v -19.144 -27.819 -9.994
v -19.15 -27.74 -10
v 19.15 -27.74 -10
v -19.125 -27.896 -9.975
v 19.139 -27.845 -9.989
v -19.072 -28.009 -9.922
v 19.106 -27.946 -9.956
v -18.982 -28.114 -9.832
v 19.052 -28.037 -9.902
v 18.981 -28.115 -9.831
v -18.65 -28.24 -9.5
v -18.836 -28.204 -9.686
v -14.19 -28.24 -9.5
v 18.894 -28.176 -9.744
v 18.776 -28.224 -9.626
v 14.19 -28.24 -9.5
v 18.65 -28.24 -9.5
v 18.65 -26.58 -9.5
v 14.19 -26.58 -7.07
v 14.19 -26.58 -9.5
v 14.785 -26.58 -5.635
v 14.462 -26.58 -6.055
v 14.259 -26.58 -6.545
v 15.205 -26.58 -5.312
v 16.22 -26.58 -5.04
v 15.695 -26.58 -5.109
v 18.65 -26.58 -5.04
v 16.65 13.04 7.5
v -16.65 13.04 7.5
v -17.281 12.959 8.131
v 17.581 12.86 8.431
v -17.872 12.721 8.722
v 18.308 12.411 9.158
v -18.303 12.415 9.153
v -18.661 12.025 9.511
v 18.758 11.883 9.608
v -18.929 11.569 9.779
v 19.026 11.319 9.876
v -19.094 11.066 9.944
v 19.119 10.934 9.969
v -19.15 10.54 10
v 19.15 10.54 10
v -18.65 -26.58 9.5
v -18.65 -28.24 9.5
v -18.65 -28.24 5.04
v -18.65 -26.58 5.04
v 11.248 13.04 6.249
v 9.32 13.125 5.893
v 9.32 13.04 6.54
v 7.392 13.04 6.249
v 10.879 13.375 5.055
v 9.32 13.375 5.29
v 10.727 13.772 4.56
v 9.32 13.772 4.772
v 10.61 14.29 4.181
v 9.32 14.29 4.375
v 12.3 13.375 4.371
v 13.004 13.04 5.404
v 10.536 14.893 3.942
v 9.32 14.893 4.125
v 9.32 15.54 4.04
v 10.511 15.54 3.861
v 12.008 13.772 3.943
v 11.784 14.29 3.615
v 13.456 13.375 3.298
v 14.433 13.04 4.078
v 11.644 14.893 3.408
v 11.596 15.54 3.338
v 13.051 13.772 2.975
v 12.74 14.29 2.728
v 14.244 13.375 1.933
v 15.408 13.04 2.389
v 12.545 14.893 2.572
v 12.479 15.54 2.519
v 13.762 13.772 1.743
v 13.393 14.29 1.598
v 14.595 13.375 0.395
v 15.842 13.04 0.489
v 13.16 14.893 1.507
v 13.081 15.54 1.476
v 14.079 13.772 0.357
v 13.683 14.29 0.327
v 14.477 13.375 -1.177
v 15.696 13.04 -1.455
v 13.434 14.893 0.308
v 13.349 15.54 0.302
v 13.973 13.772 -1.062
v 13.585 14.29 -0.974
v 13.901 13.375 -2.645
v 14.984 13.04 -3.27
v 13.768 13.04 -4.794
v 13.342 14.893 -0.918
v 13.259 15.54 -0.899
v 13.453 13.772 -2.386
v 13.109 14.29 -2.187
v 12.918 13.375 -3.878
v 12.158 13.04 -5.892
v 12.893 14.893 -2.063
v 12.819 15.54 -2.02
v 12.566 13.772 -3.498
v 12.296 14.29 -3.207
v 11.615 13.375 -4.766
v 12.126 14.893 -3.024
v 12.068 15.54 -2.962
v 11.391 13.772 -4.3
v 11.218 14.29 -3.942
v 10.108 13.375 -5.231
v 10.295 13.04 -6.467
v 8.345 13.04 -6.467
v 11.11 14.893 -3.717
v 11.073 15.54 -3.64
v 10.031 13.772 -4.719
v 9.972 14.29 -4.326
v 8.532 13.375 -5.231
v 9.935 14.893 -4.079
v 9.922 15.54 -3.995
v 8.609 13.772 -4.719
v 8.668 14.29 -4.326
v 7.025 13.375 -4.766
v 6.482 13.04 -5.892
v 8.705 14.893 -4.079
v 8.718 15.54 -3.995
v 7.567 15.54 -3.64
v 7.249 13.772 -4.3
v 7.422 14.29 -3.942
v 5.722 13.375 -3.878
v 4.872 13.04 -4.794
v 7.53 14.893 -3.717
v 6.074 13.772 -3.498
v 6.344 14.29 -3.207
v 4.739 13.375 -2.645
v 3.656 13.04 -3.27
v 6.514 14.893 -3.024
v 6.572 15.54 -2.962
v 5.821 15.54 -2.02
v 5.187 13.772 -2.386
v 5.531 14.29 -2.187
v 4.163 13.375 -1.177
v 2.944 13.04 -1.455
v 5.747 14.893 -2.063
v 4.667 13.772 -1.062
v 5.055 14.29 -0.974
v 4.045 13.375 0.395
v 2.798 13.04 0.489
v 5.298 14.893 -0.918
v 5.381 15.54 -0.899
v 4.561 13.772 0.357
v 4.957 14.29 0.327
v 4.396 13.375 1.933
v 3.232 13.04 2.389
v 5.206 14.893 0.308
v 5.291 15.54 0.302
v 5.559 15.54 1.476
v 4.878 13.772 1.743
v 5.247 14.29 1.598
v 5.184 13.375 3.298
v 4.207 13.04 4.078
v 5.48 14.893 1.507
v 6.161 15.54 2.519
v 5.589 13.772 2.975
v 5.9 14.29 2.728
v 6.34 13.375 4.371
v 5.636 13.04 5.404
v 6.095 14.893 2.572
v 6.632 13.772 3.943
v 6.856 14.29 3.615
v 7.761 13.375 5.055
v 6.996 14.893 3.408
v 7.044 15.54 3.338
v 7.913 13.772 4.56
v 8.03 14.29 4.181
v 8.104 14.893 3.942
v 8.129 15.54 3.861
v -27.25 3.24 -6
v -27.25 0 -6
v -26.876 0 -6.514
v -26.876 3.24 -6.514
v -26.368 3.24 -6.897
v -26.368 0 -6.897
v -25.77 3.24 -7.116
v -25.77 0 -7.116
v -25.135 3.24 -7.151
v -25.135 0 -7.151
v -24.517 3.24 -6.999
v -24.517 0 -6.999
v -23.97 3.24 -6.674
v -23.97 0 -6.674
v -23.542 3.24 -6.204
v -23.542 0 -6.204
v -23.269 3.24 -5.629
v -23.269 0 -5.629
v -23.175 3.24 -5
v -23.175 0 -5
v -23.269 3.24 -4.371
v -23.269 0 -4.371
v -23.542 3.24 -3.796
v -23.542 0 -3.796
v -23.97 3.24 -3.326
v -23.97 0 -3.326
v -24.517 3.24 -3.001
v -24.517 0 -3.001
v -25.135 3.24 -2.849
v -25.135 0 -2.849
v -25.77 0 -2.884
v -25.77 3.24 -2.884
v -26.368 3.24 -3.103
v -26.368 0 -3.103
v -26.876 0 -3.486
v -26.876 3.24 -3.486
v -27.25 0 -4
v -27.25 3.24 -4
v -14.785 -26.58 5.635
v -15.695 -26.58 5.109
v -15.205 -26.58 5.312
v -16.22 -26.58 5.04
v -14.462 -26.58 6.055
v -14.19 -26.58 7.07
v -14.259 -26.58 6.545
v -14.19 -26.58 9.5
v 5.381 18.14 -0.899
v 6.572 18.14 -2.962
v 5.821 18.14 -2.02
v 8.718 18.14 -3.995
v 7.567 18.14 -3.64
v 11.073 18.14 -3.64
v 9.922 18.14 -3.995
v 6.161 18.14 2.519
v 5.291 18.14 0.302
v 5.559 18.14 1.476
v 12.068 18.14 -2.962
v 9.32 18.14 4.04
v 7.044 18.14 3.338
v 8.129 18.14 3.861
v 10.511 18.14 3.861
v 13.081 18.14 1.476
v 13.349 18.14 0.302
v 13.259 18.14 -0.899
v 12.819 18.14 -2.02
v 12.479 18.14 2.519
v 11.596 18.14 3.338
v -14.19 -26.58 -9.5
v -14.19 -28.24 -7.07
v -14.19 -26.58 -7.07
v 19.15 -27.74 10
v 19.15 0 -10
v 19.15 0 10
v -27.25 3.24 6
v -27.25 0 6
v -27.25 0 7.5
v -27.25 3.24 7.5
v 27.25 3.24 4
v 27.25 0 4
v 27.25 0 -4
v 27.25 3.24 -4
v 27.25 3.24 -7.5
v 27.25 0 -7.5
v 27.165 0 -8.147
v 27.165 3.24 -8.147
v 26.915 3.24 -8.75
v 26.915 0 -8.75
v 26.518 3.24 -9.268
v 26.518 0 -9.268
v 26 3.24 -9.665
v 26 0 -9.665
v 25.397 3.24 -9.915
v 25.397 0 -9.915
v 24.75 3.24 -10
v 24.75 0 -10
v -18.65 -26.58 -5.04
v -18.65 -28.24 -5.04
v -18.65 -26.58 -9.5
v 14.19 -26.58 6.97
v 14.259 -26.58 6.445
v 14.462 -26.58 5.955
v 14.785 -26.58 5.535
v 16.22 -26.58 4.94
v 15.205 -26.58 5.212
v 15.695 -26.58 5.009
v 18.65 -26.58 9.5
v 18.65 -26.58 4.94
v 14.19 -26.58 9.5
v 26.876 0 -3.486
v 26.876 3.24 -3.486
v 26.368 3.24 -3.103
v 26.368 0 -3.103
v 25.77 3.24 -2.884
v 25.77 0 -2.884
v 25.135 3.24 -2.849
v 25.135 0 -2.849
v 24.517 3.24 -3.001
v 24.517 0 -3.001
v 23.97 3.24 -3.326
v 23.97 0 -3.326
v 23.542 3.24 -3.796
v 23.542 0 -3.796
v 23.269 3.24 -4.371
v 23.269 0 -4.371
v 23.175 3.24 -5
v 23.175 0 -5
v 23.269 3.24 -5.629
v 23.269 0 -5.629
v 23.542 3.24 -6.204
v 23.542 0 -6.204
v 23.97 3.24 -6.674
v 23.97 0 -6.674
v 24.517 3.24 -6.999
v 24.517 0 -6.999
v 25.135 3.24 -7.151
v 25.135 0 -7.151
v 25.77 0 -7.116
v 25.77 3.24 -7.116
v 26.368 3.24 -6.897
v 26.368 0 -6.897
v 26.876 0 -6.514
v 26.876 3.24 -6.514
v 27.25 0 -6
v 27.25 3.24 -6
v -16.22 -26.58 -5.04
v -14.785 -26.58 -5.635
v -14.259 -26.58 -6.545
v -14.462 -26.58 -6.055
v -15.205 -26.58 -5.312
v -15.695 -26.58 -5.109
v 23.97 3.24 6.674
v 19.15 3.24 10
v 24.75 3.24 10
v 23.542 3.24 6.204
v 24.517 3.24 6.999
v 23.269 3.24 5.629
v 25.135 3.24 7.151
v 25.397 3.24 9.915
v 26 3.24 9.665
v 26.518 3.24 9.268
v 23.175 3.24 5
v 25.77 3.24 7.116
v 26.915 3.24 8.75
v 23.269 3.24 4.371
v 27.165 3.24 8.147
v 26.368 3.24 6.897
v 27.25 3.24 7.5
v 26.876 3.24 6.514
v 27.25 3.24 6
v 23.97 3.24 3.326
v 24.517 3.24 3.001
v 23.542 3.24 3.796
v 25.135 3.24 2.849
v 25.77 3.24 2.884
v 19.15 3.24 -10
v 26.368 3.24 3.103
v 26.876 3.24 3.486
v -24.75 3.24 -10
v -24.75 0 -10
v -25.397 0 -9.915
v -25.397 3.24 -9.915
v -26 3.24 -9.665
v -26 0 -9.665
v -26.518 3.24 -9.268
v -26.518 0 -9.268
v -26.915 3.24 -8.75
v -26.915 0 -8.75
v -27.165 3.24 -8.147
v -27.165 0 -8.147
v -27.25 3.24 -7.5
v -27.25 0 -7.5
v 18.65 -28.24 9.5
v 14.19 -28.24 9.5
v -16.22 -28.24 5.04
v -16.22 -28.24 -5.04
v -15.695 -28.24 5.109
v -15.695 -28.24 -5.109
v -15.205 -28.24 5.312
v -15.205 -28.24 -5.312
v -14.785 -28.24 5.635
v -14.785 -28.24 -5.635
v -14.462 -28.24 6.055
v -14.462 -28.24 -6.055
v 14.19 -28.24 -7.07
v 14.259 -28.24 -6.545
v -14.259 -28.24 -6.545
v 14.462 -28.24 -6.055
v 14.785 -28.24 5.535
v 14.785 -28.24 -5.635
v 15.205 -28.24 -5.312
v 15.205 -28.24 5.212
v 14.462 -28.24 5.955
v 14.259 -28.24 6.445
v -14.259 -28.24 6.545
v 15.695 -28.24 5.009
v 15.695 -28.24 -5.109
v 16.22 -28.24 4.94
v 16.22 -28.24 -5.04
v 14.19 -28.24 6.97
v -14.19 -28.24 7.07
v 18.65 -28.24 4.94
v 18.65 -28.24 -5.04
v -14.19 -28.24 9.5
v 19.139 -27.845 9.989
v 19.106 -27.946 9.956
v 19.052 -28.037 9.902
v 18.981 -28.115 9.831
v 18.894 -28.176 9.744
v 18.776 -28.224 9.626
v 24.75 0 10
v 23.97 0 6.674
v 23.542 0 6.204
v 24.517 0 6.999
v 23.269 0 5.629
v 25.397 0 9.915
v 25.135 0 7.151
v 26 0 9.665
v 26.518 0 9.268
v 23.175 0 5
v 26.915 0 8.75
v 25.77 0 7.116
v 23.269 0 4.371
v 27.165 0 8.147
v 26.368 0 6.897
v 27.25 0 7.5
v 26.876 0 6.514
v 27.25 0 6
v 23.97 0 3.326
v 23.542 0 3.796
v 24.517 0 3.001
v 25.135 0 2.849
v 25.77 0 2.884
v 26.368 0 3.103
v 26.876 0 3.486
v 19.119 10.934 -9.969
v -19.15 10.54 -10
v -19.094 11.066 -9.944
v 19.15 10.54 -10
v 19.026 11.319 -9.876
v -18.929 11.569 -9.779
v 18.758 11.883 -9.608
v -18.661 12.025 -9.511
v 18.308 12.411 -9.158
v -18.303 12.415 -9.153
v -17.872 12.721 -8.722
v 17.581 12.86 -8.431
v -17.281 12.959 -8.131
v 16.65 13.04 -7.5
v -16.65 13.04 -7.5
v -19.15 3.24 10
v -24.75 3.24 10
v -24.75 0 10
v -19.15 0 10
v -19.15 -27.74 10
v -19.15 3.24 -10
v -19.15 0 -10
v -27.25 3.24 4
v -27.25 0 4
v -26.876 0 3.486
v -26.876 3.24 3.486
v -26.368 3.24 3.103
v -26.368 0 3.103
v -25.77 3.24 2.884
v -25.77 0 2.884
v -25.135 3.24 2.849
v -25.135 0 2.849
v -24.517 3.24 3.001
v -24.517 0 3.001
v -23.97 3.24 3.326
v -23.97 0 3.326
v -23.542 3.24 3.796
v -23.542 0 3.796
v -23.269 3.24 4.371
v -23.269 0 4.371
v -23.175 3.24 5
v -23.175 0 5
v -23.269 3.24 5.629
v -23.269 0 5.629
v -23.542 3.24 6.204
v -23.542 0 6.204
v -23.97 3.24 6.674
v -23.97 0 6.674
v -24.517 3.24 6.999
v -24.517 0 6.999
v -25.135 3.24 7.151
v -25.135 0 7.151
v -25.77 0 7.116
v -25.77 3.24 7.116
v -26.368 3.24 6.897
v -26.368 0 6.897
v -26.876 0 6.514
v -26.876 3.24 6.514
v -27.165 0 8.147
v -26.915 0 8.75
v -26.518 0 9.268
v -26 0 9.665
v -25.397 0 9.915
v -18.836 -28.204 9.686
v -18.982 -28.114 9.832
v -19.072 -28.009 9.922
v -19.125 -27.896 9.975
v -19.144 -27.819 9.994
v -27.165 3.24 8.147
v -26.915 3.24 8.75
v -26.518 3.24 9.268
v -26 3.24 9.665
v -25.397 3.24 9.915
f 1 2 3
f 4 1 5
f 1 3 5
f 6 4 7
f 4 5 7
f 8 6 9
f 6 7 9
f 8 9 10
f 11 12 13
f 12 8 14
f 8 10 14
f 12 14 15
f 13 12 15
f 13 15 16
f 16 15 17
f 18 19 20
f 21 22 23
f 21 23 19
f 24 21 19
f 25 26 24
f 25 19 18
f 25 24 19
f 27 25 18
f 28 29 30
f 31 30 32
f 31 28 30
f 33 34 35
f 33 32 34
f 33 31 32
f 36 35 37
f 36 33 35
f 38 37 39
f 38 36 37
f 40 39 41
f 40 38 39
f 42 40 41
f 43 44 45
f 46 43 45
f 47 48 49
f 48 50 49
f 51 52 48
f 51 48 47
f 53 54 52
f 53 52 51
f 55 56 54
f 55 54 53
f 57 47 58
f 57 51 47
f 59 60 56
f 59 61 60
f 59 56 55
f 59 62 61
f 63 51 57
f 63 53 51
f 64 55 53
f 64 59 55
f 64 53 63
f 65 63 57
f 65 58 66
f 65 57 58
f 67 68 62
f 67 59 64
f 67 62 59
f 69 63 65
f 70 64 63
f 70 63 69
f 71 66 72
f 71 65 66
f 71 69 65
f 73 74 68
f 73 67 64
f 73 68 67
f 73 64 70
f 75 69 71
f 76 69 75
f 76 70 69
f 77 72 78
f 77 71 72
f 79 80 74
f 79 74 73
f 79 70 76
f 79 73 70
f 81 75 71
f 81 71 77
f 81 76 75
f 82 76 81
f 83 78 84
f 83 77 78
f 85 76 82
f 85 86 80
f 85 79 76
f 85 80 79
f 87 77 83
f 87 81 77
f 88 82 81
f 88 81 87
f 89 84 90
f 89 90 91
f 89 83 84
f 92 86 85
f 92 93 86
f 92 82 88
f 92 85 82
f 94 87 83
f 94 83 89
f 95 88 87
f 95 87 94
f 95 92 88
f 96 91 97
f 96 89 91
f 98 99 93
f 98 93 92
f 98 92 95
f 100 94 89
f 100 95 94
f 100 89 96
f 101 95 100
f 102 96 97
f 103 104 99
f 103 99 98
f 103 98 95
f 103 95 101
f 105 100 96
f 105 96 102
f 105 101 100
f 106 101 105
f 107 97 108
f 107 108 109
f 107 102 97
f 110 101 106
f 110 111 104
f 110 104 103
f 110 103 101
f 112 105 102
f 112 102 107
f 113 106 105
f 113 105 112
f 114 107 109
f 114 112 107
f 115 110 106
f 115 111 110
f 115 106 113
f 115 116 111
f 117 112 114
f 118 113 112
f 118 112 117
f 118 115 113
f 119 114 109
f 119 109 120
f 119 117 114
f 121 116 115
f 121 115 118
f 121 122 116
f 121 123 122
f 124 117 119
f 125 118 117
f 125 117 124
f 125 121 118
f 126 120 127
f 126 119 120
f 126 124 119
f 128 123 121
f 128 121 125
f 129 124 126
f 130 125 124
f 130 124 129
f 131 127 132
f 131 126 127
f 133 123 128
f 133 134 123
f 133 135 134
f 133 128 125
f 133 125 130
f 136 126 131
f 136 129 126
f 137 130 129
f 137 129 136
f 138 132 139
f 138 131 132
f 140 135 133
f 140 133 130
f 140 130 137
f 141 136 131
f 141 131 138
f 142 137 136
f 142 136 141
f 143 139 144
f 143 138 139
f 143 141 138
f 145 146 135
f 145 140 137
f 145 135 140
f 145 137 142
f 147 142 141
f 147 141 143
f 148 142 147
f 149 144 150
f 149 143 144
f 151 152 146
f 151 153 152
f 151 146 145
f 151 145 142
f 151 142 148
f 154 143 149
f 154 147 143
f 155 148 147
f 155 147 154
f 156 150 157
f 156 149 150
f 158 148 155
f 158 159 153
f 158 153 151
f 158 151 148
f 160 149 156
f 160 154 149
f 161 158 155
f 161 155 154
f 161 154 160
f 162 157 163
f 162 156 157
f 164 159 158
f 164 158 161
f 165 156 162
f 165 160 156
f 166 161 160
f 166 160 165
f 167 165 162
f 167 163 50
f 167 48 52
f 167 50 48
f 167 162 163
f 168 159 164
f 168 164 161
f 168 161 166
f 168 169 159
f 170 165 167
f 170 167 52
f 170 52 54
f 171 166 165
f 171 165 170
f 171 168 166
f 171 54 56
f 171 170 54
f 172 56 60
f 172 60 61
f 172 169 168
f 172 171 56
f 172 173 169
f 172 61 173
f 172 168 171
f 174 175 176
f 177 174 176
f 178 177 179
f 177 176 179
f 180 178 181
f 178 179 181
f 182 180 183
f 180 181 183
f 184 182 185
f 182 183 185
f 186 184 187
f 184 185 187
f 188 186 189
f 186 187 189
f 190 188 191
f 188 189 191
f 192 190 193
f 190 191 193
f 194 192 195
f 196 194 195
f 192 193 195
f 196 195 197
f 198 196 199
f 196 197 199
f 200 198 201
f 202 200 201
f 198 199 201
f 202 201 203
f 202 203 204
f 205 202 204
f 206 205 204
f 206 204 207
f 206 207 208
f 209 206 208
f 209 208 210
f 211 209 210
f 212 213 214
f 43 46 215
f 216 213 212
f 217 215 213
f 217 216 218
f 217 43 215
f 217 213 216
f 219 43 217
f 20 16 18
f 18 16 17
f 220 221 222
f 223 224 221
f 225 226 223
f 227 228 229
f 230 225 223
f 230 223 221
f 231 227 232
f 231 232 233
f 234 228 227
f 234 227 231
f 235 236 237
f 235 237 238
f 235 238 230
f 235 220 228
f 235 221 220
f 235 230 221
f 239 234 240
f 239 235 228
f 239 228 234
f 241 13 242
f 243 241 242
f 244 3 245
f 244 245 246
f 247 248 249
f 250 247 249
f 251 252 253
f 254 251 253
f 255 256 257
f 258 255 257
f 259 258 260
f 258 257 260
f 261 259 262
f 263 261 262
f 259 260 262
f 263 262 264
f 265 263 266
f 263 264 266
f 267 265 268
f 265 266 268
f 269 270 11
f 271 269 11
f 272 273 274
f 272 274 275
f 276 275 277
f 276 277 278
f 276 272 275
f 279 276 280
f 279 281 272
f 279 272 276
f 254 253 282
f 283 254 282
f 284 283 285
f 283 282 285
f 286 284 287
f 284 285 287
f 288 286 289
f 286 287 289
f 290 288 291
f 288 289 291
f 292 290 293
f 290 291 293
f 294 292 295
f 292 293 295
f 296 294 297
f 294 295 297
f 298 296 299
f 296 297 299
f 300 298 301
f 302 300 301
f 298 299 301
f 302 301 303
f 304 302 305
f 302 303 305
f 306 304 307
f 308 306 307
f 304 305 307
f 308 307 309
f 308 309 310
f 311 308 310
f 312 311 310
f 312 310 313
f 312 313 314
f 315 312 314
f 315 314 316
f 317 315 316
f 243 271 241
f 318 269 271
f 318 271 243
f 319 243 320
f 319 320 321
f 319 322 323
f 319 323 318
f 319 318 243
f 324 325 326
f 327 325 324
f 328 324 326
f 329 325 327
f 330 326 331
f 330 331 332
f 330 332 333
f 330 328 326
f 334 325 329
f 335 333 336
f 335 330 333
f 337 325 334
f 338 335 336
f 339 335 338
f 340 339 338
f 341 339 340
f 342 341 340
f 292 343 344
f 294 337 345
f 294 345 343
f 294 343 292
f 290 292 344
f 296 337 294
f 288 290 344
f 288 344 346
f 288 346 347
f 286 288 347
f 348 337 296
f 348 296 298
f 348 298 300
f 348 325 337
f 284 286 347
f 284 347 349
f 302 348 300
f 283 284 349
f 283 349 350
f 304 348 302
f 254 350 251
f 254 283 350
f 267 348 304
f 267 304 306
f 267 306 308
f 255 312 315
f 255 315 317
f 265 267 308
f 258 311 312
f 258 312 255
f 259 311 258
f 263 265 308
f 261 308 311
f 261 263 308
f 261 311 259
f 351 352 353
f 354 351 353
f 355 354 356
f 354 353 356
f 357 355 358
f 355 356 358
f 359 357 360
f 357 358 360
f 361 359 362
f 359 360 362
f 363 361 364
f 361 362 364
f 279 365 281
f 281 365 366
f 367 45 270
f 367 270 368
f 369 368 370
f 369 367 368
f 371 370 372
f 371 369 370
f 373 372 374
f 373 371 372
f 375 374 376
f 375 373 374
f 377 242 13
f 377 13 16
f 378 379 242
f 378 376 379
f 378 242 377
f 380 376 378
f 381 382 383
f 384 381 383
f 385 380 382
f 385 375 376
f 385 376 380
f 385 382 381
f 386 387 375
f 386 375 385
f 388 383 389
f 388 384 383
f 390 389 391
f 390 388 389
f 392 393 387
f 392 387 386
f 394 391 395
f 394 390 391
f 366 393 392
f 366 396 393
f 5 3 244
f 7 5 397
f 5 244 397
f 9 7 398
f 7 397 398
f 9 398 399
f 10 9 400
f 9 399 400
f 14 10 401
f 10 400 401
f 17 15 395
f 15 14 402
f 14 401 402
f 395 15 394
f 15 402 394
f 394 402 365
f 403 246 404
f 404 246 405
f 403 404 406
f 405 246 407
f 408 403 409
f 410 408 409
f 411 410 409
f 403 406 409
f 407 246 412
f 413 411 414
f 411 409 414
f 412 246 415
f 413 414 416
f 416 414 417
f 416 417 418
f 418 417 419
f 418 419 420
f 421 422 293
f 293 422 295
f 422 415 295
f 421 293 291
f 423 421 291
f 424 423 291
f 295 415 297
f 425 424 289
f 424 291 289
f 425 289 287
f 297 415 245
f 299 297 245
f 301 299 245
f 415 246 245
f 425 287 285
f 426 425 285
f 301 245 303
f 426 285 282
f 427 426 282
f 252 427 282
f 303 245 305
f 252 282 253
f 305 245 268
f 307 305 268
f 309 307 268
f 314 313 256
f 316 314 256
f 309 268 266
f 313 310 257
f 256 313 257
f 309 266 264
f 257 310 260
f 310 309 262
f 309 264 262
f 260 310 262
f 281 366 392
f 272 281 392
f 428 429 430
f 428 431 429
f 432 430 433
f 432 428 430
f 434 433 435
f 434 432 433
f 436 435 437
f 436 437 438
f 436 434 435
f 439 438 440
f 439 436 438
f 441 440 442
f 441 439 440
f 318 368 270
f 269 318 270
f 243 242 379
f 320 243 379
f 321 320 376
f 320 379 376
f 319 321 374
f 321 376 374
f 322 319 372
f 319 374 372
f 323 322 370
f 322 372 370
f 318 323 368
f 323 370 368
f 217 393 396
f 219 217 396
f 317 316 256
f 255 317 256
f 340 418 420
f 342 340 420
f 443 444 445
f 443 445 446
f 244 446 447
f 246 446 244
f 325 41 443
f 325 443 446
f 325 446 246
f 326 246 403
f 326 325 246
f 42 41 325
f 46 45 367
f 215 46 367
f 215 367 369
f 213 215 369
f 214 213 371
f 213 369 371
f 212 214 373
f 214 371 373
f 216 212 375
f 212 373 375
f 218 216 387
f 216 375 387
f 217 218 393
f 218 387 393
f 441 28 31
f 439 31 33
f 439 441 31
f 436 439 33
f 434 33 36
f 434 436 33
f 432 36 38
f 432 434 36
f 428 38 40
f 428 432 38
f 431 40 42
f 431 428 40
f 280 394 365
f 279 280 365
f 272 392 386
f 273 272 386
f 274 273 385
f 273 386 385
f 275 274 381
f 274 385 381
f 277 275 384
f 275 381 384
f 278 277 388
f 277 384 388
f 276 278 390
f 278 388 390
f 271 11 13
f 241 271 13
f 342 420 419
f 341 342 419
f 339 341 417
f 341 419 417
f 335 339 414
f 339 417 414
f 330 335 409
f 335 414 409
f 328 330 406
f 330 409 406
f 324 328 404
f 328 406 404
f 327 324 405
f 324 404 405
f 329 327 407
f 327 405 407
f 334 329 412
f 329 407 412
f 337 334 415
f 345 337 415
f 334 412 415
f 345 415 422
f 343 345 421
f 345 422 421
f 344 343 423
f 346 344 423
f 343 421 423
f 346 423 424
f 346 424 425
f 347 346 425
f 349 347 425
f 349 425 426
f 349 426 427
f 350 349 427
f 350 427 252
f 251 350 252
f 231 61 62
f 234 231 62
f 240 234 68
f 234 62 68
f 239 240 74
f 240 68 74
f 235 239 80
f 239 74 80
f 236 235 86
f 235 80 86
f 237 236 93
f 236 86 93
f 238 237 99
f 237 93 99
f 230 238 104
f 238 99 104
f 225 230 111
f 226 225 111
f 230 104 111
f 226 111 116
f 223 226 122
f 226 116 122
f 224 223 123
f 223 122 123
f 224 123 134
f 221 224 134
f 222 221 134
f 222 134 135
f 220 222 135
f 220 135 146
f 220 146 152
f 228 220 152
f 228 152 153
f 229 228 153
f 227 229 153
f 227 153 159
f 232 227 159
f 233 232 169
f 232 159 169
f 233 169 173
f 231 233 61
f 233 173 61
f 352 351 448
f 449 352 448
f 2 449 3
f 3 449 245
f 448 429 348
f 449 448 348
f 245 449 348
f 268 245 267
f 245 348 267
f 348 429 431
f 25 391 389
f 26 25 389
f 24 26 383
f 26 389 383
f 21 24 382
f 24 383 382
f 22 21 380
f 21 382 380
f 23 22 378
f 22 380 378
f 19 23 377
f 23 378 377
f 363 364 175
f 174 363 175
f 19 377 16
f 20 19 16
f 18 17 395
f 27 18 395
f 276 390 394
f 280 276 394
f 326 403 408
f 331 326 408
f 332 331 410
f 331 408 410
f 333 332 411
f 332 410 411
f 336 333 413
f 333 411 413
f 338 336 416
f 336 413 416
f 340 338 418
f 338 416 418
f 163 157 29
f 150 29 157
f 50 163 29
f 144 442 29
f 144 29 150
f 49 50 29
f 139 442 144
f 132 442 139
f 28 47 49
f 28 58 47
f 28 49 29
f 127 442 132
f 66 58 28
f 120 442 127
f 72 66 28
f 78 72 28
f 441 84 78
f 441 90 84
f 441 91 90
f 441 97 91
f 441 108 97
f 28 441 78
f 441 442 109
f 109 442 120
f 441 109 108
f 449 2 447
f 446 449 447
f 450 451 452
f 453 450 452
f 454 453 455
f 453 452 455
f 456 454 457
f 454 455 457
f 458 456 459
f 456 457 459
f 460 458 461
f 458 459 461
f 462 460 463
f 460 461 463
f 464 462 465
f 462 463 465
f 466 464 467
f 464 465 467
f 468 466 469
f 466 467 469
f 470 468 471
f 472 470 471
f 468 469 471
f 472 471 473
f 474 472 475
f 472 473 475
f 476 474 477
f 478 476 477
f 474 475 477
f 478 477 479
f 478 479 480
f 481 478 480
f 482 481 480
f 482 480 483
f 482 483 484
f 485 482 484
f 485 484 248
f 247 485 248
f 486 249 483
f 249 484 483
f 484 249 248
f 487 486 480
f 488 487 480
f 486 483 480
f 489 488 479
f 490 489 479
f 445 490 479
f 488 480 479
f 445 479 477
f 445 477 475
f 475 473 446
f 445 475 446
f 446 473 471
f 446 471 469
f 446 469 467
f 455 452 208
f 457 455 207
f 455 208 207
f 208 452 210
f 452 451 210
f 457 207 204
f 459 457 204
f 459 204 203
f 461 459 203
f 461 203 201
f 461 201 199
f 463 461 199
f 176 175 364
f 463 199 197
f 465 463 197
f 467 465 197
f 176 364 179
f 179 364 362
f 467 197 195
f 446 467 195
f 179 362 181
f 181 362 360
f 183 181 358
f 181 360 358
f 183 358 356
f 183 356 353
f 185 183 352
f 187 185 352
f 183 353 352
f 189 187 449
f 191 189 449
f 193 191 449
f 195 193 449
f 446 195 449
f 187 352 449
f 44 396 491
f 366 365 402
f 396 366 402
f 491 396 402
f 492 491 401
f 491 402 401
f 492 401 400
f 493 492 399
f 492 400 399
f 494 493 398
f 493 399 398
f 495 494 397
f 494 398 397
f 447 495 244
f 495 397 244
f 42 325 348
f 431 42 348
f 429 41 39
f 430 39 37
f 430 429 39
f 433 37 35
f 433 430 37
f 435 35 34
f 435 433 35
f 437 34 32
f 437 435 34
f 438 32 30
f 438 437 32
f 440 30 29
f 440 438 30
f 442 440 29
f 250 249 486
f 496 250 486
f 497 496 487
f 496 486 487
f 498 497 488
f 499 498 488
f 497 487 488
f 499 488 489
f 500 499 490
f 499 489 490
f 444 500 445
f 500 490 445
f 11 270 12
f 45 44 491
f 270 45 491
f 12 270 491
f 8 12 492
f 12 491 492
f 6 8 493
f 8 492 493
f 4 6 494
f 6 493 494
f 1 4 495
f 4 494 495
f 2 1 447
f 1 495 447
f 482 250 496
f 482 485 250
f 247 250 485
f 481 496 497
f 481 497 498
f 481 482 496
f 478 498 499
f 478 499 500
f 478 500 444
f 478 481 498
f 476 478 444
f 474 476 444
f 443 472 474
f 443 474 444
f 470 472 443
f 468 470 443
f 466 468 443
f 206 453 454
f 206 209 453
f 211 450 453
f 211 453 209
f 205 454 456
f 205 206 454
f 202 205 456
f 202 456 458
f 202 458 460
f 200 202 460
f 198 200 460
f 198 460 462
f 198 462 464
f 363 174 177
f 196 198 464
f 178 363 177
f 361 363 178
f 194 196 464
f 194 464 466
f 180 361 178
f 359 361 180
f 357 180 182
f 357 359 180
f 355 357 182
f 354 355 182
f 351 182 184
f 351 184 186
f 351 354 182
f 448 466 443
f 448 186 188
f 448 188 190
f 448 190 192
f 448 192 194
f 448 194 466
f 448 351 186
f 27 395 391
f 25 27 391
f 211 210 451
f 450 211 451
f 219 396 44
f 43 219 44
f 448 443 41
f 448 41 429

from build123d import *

# Parameters (mm, degrees)
BOSS_EXTRUDE2_DEPTH   = 3.24
BOSS_EXTRUDE2_2_DEPTH = 3.24
SKETCH1_9_W           = 38.3
SKETCH1_9_H           = 20
BOSS_EXTRUDE3_DEPTH   = 13.04
SKETCH2_R             = 4.04
BOSS_EXTRUDE4_DEPTH   = 5.1
SKETCH1_10_W          = 38.3
SKETCH1_10_H          = 20
BOSS_EXTRUDE7_DEPTH   = 16.74
SKETCH5_W             = 38.3
SKETCH5_H             = 20
BOSS_EXTRUDE8_DEPTH   = 11.5
FILLET1_R             = 2.5
FILLET2_R             = 0.5
SKETCH6_R             = 2.03
CUT_EXTRUDE1_DEPTH    = 1.66


with BuildPart() as part:
    # Sketch1 → Boss-Extrude2 (new body)
    with BuildSketch(Plane(origin=(0, 0, 0), x_dir=(1, 0, 0), z_dir=(0, 1, 0))):
        with BuildLine():
            Line((-19.15, -10), (-19.15, 10))
            Line((-19.15, 10), (-24.75, 10))
            ThreePointArc((-24.75, 10), (-26.517766953, 9.267766953), (-27.25, 7.5))
            Line((-27.25, 7.5), (-27.25, 6))
            ThreePointArc((-27.25, 6), (-23.175424329, 5), (-27.25, 4))
            Line((-27.25, 4), (-27.25, -4))
            ThreePointArc((-27.25, -4), (-23.175424329, -5), (-27.25, -6))
            Line((-27.25, -6), (-27.25, -7.5))
            ThreePointArc((-27.25, -7.5), (-26.517766953, -9.267766953), (-24.75, -10))
            Line((-24.75, -10), (-19.15, -10))
        make_face()
    extrude(amount=BOSS_EXTRUDE2_DEPTH)



with BuildPart() as body_2:
    # Sketch1 → Boss-Extrude2 2 (new body)
    with BuildSketch(Plane(origin=(0, 0, 0), x_dir=(1, 0, 0), z_dir=(0, 1, 0))):
        with BuildLine():
            Line((24.75, 10), (19.15, 10))
            Line((19.15, 10), (19.15, -10))
            Line((19.15, -10), (24.75, -10))
            ThreePointArc((24.75, -10), (26.517766953, -9.267766953), (27.25, -7.5))
            Line((27.25, -7.5), (27.25, -6))
            ThreePointArc((27.25, -6), (23.175424329, -5), (27.25, -4))
            Line((27.25, -4), (27.25, 4))
            ThreePointArc((27.25, 4), (23.175424329, 5), (27.25, 6))
            Line((27.25, 6), (27.25, 7.5))
            ThreePointArc((27.25, 7.5), (26.517766953, 9.267766953), (24.75, 10))
        make_face()
    extrude(amount=BOSS_EXTRUDE2_2_DEPTH)


with BuildPart() as part_1:
    add(part.part)

    add(body_2.part)  # Boss-Extrude3 merges body 2
    # Sketch1<9> → Boss-Extrude3 (add)
    with BuildSketch(Plane(origin=(0, 0, 0), x_dir=(1, 0, 0), z_dir=(0, 1, 0))):
        Rectangle(SKETCH1_9_W, SKETCH1_9_H)
    extrude(amount=BOSS_EXTRUDE3_DEPTH)

    # Sketch2 → Boss-Extrude4 (add)
    with BuildSketch(Plane(origin=(0, 13.04, 0), x_dir=(1, 0, 0), z_dir=(0, 1, 0))):
        with Locations(Location((9.32, 0, 0), (0, 0, 270))):
            Circle(SKETCH2_R)
    extrude(amount=BOSS_EXTRUDE4_DEPTH)

    # Sketch1<10> → Boss-Extrude7 (add)
    with BuildSketch(Plane(origin=(0, 0, 0), x_dir=(1, 0, 0), z_dir=(0, 1, 0))):
        Rectangle(SKETCH1_10_W, SKETCH1_10_H)
    extrude(amount=-BOSS_EXTRUDE7_DEPTH)

    # Sketch5 → Boss-Extrude8 (add)
    with BuildSketch(Plane.XZ.offset(16.74)):
        Rectangle(SKETCH5_W, SKETCH5_H)
    extrude(amount=BOSS_EXTRUDE8_DEPTH)

    # Fillet1
    fillet1_edges = [part_1.edges().sort_by_distance(p)[0] for p in [
        (19.15, 13.04, 0),
        (0, 13.04, -10),
        (-19.15, 13.04, 0),
        (0, 13.04, 10),
        (9.32, 13.04, -4.04),
    ]]
    fillet(fillet1_edges, radius=FILLET1_R)

    # Fillet2
    fillet2_edges = [part_1.edges().sort_by_distance(p)[0] for p in [
        (-19.15, -28.24, 0),
        (0, -28.24, -10),
        (19.15, -28.24, 0),
        (0, -28.24, 10),
    ]]
    fillet(fillet2_edges, radius=FILLET2_R)

    # Sketch6 → Cut-Extrude1 (cut)
    with BuildSketch(Plane.XZ.offset(28.24)):
        with Locations((-16.22, 7.07)):
            Circle(SKETCH6_R)
        with BuildLine():
            Line((-18.65, 9.5), (-18.65, 5.04))
            Line((-18.65, 5.04), (-16.22, 5.04))
            ThreePointArc((-16.22, 5.04), (-17.655426766, 8.505426766), (-14.19, 7.07))
            Line((-14.19, 7.07), (-14.19, 9.5))
            Line((-14.19, 9.5), (-18.65, 9.5))
        make_face()
        with Locations((-16.22, -7.07)):
            Circle(SKETCH6_R)
        with BuildLine():
            Line((-16.22, -5.04), (-18.65, -5.04))
            Line((-18.65, -5.04), (-18.65, -9.5))
            Line((-18.65, -9.5), (-14.19, -9.5))
            Line((-14.19, -9.5), (-14.19, -7.07))
            ThreePointArc((-14.19, -7.07), (-17.655426766, -8.505426766), (-16.22, -5.04))
        make_face()
        with Locations((16.22, 6.97)):
            Circle(SKETCH6_R)
        with BuildLine():
            Line((18.65, 9.5), (14.19, 9.5))
            Line((14.19, 9.5), (14.19, 6.97))
            ThreePointArc((14.19, 6.97), (16.22, 9), (18.25, 6.97))
            ThreePointArc((18.25, 6.97), (17.655426766, 5.534573234), (16.22, 4.94))
            Line((16.22, 4.94), (18.65, 4.94))
            Line((18.65, 4.94), (18.65, 9.5))
        make_face()
        with Locations((16.22, -7.07)):
            Circle(SKETCH6_R)
        with BuildLine():
            Line((14.19, -7.07), (14.19, -9.5))
            Line((14.19, -9.5), (18.65, -9.5))
            Line((18.65, -9.5), (18.65, -5.04))
            Line((18.65, -5.04), (16.22, -5.04))
            ThreePointArc((16.22, -5.04), (17.655426766, -5.634573234), (18.25, -7.07))
            ThreePointArc((18.25, -7.07), (16.22, -9.1), (14.19, -7.07))
        make_face()
    extrude(amount=-CUT_EXTRUDE1_DEPTH, mode=Mode.SUBTRACT)


solid = part_1.part
